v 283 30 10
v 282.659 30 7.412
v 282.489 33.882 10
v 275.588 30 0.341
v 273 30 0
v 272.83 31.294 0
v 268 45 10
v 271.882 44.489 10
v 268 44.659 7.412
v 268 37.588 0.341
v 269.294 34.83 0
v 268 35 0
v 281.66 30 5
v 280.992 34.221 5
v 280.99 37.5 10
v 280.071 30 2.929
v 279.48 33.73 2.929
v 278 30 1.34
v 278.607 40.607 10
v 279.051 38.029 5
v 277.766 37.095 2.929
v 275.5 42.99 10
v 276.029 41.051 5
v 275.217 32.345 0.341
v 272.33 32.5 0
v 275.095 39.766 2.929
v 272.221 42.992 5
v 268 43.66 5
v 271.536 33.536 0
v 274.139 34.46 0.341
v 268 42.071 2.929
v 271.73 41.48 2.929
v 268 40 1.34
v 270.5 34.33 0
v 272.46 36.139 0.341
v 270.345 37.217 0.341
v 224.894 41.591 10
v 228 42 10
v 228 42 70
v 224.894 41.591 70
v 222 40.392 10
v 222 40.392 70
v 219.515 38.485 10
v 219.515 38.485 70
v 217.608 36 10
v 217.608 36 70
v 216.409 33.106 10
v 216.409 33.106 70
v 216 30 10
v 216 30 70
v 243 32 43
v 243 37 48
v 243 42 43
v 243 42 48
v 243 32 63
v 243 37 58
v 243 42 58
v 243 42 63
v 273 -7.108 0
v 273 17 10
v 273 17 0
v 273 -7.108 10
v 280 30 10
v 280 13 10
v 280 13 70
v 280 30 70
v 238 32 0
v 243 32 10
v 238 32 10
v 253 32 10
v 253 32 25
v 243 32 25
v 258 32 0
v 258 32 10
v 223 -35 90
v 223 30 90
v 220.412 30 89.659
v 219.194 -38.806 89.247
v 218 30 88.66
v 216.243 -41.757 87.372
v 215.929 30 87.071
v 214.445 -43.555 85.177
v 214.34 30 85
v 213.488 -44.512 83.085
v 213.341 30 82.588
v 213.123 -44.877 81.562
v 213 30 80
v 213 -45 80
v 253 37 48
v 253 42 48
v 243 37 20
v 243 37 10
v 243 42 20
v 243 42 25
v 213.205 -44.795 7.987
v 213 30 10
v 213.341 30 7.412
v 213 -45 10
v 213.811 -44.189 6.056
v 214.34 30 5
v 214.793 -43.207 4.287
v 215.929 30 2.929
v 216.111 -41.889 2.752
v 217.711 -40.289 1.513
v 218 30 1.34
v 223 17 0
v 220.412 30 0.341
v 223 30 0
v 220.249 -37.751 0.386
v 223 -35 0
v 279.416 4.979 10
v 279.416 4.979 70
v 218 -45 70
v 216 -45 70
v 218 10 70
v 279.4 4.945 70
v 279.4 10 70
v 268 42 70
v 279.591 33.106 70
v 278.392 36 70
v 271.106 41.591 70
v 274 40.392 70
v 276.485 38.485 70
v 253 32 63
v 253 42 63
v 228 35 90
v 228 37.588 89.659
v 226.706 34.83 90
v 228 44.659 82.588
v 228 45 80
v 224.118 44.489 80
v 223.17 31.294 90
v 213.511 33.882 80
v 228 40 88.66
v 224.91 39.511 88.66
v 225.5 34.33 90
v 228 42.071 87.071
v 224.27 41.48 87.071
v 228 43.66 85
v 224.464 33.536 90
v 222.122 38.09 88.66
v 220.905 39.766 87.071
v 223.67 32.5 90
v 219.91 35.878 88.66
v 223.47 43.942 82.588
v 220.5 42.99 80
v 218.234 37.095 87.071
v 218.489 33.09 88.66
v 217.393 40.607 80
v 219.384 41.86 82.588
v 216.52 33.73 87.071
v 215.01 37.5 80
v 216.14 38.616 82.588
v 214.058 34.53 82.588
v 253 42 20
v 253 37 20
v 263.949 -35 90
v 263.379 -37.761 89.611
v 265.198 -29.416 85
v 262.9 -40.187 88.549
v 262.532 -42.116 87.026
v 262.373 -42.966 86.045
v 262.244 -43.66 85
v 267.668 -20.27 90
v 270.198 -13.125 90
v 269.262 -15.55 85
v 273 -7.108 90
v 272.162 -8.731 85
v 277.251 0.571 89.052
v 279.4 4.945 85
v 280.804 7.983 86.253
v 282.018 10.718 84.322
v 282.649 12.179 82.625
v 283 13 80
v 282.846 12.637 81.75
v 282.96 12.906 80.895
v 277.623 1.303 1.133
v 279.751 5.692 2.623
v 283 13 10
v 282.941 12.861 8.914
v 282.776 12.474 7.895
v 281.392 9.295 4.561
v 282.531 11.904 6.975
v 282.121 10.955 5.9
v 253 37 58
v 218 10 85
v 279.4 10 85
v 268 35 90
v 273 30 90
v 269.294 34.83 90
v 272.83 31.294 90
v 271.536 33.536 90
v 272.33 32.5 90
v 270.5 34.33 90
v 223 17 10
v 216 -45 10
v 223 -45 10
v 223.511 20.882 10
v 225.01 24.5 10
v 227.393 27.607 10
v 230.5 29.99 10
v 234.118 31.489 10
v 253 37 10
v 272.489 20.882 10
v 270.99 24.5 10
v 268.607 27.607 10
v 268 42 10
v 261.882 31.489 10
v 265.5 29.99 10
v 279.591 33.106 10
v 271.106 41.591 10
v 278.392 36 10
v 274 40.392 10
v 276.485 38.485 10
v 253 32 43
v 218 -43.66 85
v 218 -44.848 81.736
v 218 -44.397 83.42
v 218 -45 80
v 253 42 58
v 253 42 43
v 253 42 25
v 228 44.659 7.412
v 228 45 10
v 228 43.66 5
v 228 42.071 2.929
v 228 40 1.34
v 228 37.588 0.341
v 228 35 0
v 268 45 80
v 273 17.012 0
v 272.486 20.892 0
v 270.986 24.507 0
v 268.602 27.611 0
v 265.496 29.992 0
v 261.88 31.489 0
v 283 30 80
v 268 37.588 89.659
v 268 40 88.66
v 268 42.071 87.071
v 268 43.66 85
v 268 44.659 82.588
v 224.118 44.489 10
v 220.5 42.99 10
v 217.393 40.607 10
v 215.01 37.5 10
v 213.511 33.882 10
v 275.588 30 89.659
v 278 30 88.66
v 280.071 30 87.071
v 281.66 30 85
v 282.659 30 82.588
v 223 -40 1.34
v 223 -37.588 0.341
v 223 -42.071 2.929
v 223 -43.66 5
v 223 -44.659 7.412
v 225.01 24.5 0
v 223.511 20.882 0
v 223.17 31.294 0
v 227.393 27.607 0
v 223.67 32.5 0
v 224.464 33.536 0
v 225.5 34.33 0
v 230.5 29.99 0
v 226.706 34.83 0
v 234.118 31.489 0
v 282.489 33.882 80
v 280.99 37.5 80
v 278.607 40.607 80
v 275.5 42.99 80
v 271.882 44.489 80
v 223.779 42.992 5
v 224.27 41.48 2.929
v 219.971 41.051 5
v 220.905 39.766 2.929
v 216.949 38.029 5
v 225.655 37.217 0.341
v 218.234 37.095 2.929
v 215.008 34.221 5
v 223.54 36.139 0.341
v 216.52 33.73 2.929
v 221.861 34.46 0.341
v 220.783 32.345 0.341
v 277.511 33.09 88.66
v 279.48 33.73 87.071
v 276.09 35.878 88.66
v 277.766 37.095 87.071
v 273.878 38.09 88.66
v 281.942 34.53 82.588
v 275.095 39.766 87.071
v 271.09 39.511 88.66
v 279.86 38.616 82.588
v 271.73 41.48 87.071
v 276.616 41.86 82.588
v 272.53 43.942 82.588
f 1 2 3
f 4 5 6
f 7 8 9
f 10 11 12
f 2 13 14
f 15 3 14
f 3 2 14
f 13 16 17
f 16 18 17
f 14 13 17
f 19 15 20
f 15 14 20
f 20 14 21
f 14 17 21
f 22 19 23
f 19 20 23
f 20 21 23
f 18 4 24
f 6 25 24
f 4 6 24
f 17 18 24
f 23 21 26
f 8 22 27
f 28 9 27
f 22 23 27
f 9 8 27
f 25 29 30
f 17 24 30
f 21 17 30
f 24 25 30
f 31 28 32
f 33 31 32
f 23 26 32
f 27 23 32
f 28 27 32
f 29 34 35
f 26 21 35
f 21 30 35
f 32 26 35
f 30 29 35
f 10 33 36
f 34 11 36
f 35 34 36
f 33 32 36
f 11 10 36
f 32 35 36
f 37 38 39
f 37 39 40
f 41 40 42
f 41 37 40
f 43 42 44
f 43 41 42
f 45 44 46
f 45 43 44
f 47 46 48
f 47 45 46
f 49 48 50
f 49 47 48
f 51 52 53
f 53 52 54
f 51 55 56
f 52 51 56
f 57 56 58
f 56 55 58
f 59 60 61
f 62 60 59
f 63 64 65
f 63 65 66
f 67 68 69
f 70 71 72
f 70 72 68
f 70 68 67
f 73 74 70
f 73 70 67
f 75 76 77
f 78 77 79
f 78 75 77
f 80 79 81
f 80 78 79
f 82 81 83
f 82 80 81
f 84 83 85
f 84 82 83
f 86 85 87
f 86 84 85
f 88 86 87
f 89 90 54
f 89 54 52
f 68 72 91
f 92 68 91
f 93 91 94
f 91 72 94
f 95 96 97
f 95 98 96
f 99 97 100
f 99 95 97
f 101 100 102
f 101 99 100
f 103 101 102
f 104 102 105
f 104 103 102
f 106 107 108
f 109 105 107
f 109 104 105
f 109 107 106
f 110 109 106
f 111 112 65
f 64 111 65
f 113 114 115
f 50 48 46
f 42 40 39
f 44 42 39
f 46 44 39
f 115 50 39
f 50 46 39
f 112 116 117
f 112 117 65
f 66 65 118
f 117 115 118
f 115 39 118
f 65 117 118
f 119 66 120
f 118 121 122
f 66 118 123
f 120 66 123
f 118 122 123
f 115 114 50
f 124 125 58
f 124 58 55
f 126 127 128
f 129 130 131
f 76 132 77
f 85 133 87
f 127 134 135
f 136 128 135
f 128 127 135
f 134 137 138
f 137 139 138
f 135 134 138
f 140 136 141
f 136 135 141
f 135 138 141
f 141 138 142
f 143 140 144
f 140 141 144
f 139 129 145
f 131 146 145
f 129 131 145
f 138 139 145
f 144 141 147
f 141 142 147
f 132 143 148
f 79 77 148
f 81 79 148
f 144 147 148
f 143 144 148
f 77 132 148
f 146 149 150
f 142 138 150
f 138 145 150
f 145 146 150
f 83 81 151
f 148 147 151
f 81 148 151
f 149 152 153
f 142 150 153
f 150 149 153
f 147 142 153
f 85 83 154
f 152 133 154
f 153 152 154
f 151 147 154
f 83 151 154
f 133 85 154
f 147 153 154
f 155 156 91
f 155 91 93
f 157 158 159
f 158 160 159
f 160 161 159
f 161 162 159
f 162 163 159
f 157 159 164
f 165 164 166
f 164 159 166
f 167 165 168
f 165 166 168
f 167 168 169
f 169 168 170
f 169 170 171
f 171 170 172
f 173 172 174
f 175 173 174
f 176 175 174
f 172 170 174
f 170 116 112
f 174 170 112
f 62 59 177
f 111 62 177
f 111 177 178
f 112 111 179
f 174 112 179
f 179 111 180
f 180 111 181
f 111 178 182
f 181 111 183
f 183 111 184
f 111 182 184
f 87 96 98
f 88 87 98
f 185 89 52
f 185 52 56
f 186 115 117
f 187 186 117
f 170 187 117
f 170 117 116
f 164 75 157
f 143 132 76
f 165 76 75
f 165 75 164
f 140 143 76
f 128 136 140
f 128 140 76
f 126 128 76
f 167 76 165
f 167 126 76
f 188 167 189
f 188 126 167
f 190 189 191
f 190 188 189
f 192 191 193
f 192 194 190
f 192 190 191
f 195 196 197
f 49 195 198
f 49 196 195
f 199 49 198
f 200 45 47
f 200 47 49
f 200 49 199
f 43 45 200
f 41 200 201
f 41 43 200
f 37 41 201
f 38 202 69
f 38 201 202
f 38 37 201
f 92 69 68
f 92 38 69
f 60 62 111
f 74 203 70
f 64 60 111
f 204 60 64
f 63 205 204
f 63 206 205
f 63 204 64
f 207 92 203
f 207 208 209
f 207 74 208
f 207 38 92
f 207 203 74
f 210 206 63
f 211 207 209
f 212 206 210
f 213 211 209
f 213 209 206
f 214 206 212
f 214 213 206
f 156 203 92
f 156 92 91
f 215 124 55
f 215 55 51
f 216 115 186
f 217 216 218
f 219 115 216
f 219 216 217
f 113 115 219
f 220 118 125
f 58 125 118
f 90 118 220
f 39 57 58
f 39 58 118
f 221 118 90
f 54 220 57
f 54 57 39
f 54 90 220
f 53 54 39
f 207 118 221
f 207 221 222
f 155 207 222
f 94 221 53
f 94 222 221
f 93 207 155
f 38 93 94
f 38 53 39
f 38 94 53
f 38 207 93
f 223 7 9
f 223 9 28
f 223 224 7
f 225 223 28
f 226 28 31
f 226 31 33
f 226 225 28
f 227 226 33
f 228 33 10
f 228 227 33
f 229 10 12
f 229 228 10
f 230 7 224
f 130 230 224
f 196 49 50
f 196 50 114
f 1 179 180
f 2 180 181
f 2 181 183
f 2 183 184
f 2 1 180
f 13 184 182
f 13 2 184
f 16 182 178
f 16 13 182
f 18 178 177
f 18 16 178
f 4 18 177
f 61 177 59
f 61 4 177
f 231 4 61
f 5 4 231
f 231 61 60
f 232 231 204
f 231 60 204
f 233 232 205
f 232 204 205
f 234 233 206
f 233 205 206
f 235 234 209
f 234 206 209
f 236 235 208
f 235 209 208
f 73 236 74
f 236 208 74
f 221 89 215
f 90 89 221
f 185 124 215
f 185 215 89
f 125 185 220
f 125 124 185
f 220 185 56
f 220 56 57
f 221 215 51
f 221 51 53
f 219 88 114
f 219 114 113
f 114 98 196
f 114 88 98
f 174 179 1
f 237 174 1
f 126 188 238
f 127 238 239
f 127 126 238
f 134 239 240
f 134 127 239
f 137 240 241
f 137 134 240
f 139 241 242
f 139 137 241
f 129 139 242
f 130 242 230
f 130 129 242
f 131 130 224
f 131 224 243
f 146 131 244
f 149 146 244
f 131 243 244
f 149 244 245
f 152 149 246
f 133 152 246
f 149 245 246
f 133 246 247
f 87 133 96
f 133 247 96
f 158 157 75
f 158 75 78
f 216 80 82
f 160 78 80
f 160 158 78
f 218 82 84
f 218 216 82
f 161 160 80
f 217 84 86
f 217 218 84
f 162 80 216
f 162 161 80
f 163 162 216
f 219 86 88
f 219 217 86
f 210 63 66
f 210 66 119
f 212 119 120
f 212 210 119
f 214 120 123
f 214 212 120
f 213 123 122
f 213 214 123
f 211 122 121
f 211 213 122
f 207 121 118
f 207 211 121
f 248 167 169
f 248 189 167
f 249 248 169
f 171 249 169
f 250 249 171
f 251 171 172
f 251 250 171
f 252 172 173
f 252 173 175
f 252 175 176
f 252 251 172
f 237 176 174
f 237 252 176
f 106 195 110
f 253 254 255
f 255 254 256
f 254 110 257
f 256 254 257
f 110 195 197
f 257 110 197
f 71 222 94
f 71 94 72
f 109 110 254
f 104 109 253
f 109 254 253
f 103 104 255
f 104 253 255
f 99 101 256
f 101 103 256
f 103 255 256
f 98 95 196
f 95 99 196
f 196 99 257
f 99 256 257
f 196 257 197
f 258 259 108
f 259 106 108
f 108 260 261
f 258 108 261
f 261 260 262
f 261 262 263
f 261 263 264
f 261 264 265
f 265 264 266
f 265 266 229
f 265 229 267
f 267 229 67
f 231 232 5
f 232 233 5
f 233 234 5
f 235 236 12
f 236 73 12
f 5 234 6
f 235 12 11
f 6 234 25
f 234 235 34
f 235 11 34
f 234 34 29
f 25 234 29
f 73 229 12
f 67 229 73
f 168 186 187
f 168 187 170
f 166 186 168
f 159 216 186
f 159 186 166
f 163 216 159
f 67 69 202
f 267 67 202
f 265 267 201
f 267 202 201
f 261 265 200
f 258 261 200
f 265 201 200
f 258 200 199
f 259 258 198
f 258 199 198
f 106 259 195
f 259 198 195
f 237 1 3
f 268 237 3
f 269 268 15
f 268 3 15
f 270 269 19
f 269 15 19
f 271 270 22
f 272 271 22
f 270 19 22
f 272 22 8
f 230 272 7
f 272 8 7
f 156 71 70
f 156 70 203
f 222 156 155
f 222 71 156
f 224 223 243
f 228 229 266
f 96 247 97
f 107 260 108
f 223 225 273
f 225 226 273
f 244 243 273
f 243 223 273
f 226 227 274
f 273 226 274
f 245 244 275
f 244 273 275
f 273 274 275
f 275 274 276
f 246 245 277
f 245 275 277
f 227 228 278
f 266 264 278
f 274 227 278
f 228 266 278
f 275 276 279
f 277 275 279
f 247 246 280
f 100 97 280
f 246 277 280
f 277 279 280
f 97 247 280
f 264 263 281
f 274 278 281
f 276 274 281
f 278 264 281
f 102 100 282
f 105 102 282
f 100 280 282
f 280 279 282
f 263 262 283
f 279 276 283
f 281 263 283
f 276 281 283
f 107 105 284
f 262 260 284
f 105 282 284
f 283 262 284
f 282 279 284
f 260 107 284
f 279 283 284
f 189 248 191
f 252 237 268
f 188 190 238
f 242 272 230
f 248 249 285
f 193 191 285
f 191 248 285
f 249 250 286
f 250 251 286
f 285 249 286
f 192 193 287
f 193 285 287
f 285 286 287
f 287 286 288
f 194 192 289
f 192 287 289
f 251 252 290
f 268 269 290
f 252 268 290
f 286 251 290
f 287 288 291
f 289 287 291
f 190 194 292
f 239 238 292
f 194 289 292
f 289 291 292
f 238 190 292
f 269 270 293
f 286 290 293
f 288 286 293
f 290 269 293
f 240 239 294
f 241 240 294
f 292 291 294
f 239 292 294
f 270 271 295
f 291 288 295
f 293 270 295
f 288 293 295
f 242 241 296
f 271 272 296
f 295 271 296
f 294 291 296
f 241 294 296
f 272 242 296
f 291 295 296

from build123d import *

# Parameters (mm, degrees)
PAD004_DEPTH    = 90
POCKET007_START = 10
POCKET007_DEPTH = 60
FILLET008_R     = 10
SKETCH015_W     = 61.4
SKETCH015_H     = 55
POCKET008_DEPTH = 15
POCKET009_DEPTH = 10.001
PAD005_DEPTH    = 10


with BuildPart() as part:
    # Sketch013 → Pad004 (new body)
    with BuildSketch(Plane.XY):
        with BuildLine():
            ThreePointArc((29.999995, 30), (25.606599, 40.6066), (15, 45))
            Line((15, 45), (-25.000005, 45))
            ThreePointArc((-25.000005, 45), (-35.606603, 40.6066), (-40, 30))
            Line((-40, 30), (-40, -45))
            Line((-40, -45), (9, -45))
            add(Edge.make_bspline(
                [(9, -45), (11.5, -31.160779), (17.030905, -12), (25.199995, 1.7), (29.999995, 13)],
                knots=[0, 0, 0, 0.285616, 0.631886, 1, 1, 1], degree=2))
            Line((29.999995, 13), (29.999995, 30))
        make_face()
    extrude(amount=PAD004_DEPTH)

    # Sketch014 → Pocket007 (cut)
    with BuildSketch(Plane.XY.offset(POCKET007_START)):
        with BuildLine():
            ThreePointArc((26.999996, 30), (23.485279, 38.48528), (15, 42))
            Line((15, 42), (-25.000004, 42))
            ThreePointArc((-25.000004, 42), (-33.485283, 38.48528), (-37, 30))
            Line((-37, 30), (-37, -45))
            Line((-37, -45), (12, -45))
            add(Edge.make_bspline(
                [(12, -45), (11.5, -31.160779), (19.243267, -12), (26.999996, 1.7), (26.999996, 13)],
                knots=[0, 0, 0, 0.285616, 0.631886, 1, 1, 1], degree=2))
            Line((26.999996, 13), (26.999996, 30))
        make_face()
    extrude(amount=POCKET007_DEPTH, mode=Mode.SUBTRACT)

    # Fillet008
    fillet008_edges = [part.edges().sort_by_distance(p)[0] for p in [
        (-15.5, -45, 90),
        (-40, -7.5, 90),
        (-35.606603, 40.6066, 90),
        (-5.000002, 45, 90),
        (25.606599, 40.6066, 90),
        (29.999995, 21.5, 90),
        (29.999995, 21.5, 0),
        (25.606599, 40.6066, 0),
        (-5.000002, 45, 0),
        (-35.606603, 40.6066, 0),
        (-40, -7.5, 0),
        (-15.5, -45, 0),
    ]]
    fillet(fillet008_edges, radius=FILLET008_R)

    # Sketch015 (on Face17 of Fillet008) → Pocket008 (cut)
    with BuildSketch(Plane(origin=(0, 0, 70), x_dir=(1, 0, 0), z_dir=(0, 0, -1))):
        with Locations((-4.3, 17.5)):
            Rectangle(SKETCH015_W, SKETCH015_H)
    extrude(amount=-POCKET008_DEPTH, mode=Mode.SUBTRACT)

    # Sketch017 (on Face19 of Pocket008) → Pocket009 (cut, through all)
    with BuildSketch(Plane.XY.offset(10)):
        with BuildLine():
            ThreePointArc((-15.000005, 32), (-25.606603, 27.6066), (-30, 17))
            Line((-30, 17), (-30, -45))
            Line((-30, -45), (20, -45))
            Line((20, 17), (20, -45))
            ThreePointArc((20, 17), (15.606603, 27.6066), (5.000005, 32))
            Line((-15.000005, 32), (5.000005, 32))
        make_face()
    extrude(amount=-POCKET009_DEPTH, mode=Mode.SUBTRACT)

    # Sketch016 → Pad005 (join)
    with BuildSketch(Plane.YZ):
        Polygon((32, 63), (32, 43), (42, 43), (42, 48), (37, 48), (37, 58), (42, 58), (42, 63), align=None)
        Polygon((32, 25), (32, 5), (42, 5), (42, 10), (37, 10), (37, 20), (42, 20), (42, 25), align=None)
    extrude(amount=-PAD005_DEPTH)


with BuildPart() as part_1:
    # Body007 placement: moved
    add(part.part.moved(Location((253, 0, 0))))


solid = part_1.part
